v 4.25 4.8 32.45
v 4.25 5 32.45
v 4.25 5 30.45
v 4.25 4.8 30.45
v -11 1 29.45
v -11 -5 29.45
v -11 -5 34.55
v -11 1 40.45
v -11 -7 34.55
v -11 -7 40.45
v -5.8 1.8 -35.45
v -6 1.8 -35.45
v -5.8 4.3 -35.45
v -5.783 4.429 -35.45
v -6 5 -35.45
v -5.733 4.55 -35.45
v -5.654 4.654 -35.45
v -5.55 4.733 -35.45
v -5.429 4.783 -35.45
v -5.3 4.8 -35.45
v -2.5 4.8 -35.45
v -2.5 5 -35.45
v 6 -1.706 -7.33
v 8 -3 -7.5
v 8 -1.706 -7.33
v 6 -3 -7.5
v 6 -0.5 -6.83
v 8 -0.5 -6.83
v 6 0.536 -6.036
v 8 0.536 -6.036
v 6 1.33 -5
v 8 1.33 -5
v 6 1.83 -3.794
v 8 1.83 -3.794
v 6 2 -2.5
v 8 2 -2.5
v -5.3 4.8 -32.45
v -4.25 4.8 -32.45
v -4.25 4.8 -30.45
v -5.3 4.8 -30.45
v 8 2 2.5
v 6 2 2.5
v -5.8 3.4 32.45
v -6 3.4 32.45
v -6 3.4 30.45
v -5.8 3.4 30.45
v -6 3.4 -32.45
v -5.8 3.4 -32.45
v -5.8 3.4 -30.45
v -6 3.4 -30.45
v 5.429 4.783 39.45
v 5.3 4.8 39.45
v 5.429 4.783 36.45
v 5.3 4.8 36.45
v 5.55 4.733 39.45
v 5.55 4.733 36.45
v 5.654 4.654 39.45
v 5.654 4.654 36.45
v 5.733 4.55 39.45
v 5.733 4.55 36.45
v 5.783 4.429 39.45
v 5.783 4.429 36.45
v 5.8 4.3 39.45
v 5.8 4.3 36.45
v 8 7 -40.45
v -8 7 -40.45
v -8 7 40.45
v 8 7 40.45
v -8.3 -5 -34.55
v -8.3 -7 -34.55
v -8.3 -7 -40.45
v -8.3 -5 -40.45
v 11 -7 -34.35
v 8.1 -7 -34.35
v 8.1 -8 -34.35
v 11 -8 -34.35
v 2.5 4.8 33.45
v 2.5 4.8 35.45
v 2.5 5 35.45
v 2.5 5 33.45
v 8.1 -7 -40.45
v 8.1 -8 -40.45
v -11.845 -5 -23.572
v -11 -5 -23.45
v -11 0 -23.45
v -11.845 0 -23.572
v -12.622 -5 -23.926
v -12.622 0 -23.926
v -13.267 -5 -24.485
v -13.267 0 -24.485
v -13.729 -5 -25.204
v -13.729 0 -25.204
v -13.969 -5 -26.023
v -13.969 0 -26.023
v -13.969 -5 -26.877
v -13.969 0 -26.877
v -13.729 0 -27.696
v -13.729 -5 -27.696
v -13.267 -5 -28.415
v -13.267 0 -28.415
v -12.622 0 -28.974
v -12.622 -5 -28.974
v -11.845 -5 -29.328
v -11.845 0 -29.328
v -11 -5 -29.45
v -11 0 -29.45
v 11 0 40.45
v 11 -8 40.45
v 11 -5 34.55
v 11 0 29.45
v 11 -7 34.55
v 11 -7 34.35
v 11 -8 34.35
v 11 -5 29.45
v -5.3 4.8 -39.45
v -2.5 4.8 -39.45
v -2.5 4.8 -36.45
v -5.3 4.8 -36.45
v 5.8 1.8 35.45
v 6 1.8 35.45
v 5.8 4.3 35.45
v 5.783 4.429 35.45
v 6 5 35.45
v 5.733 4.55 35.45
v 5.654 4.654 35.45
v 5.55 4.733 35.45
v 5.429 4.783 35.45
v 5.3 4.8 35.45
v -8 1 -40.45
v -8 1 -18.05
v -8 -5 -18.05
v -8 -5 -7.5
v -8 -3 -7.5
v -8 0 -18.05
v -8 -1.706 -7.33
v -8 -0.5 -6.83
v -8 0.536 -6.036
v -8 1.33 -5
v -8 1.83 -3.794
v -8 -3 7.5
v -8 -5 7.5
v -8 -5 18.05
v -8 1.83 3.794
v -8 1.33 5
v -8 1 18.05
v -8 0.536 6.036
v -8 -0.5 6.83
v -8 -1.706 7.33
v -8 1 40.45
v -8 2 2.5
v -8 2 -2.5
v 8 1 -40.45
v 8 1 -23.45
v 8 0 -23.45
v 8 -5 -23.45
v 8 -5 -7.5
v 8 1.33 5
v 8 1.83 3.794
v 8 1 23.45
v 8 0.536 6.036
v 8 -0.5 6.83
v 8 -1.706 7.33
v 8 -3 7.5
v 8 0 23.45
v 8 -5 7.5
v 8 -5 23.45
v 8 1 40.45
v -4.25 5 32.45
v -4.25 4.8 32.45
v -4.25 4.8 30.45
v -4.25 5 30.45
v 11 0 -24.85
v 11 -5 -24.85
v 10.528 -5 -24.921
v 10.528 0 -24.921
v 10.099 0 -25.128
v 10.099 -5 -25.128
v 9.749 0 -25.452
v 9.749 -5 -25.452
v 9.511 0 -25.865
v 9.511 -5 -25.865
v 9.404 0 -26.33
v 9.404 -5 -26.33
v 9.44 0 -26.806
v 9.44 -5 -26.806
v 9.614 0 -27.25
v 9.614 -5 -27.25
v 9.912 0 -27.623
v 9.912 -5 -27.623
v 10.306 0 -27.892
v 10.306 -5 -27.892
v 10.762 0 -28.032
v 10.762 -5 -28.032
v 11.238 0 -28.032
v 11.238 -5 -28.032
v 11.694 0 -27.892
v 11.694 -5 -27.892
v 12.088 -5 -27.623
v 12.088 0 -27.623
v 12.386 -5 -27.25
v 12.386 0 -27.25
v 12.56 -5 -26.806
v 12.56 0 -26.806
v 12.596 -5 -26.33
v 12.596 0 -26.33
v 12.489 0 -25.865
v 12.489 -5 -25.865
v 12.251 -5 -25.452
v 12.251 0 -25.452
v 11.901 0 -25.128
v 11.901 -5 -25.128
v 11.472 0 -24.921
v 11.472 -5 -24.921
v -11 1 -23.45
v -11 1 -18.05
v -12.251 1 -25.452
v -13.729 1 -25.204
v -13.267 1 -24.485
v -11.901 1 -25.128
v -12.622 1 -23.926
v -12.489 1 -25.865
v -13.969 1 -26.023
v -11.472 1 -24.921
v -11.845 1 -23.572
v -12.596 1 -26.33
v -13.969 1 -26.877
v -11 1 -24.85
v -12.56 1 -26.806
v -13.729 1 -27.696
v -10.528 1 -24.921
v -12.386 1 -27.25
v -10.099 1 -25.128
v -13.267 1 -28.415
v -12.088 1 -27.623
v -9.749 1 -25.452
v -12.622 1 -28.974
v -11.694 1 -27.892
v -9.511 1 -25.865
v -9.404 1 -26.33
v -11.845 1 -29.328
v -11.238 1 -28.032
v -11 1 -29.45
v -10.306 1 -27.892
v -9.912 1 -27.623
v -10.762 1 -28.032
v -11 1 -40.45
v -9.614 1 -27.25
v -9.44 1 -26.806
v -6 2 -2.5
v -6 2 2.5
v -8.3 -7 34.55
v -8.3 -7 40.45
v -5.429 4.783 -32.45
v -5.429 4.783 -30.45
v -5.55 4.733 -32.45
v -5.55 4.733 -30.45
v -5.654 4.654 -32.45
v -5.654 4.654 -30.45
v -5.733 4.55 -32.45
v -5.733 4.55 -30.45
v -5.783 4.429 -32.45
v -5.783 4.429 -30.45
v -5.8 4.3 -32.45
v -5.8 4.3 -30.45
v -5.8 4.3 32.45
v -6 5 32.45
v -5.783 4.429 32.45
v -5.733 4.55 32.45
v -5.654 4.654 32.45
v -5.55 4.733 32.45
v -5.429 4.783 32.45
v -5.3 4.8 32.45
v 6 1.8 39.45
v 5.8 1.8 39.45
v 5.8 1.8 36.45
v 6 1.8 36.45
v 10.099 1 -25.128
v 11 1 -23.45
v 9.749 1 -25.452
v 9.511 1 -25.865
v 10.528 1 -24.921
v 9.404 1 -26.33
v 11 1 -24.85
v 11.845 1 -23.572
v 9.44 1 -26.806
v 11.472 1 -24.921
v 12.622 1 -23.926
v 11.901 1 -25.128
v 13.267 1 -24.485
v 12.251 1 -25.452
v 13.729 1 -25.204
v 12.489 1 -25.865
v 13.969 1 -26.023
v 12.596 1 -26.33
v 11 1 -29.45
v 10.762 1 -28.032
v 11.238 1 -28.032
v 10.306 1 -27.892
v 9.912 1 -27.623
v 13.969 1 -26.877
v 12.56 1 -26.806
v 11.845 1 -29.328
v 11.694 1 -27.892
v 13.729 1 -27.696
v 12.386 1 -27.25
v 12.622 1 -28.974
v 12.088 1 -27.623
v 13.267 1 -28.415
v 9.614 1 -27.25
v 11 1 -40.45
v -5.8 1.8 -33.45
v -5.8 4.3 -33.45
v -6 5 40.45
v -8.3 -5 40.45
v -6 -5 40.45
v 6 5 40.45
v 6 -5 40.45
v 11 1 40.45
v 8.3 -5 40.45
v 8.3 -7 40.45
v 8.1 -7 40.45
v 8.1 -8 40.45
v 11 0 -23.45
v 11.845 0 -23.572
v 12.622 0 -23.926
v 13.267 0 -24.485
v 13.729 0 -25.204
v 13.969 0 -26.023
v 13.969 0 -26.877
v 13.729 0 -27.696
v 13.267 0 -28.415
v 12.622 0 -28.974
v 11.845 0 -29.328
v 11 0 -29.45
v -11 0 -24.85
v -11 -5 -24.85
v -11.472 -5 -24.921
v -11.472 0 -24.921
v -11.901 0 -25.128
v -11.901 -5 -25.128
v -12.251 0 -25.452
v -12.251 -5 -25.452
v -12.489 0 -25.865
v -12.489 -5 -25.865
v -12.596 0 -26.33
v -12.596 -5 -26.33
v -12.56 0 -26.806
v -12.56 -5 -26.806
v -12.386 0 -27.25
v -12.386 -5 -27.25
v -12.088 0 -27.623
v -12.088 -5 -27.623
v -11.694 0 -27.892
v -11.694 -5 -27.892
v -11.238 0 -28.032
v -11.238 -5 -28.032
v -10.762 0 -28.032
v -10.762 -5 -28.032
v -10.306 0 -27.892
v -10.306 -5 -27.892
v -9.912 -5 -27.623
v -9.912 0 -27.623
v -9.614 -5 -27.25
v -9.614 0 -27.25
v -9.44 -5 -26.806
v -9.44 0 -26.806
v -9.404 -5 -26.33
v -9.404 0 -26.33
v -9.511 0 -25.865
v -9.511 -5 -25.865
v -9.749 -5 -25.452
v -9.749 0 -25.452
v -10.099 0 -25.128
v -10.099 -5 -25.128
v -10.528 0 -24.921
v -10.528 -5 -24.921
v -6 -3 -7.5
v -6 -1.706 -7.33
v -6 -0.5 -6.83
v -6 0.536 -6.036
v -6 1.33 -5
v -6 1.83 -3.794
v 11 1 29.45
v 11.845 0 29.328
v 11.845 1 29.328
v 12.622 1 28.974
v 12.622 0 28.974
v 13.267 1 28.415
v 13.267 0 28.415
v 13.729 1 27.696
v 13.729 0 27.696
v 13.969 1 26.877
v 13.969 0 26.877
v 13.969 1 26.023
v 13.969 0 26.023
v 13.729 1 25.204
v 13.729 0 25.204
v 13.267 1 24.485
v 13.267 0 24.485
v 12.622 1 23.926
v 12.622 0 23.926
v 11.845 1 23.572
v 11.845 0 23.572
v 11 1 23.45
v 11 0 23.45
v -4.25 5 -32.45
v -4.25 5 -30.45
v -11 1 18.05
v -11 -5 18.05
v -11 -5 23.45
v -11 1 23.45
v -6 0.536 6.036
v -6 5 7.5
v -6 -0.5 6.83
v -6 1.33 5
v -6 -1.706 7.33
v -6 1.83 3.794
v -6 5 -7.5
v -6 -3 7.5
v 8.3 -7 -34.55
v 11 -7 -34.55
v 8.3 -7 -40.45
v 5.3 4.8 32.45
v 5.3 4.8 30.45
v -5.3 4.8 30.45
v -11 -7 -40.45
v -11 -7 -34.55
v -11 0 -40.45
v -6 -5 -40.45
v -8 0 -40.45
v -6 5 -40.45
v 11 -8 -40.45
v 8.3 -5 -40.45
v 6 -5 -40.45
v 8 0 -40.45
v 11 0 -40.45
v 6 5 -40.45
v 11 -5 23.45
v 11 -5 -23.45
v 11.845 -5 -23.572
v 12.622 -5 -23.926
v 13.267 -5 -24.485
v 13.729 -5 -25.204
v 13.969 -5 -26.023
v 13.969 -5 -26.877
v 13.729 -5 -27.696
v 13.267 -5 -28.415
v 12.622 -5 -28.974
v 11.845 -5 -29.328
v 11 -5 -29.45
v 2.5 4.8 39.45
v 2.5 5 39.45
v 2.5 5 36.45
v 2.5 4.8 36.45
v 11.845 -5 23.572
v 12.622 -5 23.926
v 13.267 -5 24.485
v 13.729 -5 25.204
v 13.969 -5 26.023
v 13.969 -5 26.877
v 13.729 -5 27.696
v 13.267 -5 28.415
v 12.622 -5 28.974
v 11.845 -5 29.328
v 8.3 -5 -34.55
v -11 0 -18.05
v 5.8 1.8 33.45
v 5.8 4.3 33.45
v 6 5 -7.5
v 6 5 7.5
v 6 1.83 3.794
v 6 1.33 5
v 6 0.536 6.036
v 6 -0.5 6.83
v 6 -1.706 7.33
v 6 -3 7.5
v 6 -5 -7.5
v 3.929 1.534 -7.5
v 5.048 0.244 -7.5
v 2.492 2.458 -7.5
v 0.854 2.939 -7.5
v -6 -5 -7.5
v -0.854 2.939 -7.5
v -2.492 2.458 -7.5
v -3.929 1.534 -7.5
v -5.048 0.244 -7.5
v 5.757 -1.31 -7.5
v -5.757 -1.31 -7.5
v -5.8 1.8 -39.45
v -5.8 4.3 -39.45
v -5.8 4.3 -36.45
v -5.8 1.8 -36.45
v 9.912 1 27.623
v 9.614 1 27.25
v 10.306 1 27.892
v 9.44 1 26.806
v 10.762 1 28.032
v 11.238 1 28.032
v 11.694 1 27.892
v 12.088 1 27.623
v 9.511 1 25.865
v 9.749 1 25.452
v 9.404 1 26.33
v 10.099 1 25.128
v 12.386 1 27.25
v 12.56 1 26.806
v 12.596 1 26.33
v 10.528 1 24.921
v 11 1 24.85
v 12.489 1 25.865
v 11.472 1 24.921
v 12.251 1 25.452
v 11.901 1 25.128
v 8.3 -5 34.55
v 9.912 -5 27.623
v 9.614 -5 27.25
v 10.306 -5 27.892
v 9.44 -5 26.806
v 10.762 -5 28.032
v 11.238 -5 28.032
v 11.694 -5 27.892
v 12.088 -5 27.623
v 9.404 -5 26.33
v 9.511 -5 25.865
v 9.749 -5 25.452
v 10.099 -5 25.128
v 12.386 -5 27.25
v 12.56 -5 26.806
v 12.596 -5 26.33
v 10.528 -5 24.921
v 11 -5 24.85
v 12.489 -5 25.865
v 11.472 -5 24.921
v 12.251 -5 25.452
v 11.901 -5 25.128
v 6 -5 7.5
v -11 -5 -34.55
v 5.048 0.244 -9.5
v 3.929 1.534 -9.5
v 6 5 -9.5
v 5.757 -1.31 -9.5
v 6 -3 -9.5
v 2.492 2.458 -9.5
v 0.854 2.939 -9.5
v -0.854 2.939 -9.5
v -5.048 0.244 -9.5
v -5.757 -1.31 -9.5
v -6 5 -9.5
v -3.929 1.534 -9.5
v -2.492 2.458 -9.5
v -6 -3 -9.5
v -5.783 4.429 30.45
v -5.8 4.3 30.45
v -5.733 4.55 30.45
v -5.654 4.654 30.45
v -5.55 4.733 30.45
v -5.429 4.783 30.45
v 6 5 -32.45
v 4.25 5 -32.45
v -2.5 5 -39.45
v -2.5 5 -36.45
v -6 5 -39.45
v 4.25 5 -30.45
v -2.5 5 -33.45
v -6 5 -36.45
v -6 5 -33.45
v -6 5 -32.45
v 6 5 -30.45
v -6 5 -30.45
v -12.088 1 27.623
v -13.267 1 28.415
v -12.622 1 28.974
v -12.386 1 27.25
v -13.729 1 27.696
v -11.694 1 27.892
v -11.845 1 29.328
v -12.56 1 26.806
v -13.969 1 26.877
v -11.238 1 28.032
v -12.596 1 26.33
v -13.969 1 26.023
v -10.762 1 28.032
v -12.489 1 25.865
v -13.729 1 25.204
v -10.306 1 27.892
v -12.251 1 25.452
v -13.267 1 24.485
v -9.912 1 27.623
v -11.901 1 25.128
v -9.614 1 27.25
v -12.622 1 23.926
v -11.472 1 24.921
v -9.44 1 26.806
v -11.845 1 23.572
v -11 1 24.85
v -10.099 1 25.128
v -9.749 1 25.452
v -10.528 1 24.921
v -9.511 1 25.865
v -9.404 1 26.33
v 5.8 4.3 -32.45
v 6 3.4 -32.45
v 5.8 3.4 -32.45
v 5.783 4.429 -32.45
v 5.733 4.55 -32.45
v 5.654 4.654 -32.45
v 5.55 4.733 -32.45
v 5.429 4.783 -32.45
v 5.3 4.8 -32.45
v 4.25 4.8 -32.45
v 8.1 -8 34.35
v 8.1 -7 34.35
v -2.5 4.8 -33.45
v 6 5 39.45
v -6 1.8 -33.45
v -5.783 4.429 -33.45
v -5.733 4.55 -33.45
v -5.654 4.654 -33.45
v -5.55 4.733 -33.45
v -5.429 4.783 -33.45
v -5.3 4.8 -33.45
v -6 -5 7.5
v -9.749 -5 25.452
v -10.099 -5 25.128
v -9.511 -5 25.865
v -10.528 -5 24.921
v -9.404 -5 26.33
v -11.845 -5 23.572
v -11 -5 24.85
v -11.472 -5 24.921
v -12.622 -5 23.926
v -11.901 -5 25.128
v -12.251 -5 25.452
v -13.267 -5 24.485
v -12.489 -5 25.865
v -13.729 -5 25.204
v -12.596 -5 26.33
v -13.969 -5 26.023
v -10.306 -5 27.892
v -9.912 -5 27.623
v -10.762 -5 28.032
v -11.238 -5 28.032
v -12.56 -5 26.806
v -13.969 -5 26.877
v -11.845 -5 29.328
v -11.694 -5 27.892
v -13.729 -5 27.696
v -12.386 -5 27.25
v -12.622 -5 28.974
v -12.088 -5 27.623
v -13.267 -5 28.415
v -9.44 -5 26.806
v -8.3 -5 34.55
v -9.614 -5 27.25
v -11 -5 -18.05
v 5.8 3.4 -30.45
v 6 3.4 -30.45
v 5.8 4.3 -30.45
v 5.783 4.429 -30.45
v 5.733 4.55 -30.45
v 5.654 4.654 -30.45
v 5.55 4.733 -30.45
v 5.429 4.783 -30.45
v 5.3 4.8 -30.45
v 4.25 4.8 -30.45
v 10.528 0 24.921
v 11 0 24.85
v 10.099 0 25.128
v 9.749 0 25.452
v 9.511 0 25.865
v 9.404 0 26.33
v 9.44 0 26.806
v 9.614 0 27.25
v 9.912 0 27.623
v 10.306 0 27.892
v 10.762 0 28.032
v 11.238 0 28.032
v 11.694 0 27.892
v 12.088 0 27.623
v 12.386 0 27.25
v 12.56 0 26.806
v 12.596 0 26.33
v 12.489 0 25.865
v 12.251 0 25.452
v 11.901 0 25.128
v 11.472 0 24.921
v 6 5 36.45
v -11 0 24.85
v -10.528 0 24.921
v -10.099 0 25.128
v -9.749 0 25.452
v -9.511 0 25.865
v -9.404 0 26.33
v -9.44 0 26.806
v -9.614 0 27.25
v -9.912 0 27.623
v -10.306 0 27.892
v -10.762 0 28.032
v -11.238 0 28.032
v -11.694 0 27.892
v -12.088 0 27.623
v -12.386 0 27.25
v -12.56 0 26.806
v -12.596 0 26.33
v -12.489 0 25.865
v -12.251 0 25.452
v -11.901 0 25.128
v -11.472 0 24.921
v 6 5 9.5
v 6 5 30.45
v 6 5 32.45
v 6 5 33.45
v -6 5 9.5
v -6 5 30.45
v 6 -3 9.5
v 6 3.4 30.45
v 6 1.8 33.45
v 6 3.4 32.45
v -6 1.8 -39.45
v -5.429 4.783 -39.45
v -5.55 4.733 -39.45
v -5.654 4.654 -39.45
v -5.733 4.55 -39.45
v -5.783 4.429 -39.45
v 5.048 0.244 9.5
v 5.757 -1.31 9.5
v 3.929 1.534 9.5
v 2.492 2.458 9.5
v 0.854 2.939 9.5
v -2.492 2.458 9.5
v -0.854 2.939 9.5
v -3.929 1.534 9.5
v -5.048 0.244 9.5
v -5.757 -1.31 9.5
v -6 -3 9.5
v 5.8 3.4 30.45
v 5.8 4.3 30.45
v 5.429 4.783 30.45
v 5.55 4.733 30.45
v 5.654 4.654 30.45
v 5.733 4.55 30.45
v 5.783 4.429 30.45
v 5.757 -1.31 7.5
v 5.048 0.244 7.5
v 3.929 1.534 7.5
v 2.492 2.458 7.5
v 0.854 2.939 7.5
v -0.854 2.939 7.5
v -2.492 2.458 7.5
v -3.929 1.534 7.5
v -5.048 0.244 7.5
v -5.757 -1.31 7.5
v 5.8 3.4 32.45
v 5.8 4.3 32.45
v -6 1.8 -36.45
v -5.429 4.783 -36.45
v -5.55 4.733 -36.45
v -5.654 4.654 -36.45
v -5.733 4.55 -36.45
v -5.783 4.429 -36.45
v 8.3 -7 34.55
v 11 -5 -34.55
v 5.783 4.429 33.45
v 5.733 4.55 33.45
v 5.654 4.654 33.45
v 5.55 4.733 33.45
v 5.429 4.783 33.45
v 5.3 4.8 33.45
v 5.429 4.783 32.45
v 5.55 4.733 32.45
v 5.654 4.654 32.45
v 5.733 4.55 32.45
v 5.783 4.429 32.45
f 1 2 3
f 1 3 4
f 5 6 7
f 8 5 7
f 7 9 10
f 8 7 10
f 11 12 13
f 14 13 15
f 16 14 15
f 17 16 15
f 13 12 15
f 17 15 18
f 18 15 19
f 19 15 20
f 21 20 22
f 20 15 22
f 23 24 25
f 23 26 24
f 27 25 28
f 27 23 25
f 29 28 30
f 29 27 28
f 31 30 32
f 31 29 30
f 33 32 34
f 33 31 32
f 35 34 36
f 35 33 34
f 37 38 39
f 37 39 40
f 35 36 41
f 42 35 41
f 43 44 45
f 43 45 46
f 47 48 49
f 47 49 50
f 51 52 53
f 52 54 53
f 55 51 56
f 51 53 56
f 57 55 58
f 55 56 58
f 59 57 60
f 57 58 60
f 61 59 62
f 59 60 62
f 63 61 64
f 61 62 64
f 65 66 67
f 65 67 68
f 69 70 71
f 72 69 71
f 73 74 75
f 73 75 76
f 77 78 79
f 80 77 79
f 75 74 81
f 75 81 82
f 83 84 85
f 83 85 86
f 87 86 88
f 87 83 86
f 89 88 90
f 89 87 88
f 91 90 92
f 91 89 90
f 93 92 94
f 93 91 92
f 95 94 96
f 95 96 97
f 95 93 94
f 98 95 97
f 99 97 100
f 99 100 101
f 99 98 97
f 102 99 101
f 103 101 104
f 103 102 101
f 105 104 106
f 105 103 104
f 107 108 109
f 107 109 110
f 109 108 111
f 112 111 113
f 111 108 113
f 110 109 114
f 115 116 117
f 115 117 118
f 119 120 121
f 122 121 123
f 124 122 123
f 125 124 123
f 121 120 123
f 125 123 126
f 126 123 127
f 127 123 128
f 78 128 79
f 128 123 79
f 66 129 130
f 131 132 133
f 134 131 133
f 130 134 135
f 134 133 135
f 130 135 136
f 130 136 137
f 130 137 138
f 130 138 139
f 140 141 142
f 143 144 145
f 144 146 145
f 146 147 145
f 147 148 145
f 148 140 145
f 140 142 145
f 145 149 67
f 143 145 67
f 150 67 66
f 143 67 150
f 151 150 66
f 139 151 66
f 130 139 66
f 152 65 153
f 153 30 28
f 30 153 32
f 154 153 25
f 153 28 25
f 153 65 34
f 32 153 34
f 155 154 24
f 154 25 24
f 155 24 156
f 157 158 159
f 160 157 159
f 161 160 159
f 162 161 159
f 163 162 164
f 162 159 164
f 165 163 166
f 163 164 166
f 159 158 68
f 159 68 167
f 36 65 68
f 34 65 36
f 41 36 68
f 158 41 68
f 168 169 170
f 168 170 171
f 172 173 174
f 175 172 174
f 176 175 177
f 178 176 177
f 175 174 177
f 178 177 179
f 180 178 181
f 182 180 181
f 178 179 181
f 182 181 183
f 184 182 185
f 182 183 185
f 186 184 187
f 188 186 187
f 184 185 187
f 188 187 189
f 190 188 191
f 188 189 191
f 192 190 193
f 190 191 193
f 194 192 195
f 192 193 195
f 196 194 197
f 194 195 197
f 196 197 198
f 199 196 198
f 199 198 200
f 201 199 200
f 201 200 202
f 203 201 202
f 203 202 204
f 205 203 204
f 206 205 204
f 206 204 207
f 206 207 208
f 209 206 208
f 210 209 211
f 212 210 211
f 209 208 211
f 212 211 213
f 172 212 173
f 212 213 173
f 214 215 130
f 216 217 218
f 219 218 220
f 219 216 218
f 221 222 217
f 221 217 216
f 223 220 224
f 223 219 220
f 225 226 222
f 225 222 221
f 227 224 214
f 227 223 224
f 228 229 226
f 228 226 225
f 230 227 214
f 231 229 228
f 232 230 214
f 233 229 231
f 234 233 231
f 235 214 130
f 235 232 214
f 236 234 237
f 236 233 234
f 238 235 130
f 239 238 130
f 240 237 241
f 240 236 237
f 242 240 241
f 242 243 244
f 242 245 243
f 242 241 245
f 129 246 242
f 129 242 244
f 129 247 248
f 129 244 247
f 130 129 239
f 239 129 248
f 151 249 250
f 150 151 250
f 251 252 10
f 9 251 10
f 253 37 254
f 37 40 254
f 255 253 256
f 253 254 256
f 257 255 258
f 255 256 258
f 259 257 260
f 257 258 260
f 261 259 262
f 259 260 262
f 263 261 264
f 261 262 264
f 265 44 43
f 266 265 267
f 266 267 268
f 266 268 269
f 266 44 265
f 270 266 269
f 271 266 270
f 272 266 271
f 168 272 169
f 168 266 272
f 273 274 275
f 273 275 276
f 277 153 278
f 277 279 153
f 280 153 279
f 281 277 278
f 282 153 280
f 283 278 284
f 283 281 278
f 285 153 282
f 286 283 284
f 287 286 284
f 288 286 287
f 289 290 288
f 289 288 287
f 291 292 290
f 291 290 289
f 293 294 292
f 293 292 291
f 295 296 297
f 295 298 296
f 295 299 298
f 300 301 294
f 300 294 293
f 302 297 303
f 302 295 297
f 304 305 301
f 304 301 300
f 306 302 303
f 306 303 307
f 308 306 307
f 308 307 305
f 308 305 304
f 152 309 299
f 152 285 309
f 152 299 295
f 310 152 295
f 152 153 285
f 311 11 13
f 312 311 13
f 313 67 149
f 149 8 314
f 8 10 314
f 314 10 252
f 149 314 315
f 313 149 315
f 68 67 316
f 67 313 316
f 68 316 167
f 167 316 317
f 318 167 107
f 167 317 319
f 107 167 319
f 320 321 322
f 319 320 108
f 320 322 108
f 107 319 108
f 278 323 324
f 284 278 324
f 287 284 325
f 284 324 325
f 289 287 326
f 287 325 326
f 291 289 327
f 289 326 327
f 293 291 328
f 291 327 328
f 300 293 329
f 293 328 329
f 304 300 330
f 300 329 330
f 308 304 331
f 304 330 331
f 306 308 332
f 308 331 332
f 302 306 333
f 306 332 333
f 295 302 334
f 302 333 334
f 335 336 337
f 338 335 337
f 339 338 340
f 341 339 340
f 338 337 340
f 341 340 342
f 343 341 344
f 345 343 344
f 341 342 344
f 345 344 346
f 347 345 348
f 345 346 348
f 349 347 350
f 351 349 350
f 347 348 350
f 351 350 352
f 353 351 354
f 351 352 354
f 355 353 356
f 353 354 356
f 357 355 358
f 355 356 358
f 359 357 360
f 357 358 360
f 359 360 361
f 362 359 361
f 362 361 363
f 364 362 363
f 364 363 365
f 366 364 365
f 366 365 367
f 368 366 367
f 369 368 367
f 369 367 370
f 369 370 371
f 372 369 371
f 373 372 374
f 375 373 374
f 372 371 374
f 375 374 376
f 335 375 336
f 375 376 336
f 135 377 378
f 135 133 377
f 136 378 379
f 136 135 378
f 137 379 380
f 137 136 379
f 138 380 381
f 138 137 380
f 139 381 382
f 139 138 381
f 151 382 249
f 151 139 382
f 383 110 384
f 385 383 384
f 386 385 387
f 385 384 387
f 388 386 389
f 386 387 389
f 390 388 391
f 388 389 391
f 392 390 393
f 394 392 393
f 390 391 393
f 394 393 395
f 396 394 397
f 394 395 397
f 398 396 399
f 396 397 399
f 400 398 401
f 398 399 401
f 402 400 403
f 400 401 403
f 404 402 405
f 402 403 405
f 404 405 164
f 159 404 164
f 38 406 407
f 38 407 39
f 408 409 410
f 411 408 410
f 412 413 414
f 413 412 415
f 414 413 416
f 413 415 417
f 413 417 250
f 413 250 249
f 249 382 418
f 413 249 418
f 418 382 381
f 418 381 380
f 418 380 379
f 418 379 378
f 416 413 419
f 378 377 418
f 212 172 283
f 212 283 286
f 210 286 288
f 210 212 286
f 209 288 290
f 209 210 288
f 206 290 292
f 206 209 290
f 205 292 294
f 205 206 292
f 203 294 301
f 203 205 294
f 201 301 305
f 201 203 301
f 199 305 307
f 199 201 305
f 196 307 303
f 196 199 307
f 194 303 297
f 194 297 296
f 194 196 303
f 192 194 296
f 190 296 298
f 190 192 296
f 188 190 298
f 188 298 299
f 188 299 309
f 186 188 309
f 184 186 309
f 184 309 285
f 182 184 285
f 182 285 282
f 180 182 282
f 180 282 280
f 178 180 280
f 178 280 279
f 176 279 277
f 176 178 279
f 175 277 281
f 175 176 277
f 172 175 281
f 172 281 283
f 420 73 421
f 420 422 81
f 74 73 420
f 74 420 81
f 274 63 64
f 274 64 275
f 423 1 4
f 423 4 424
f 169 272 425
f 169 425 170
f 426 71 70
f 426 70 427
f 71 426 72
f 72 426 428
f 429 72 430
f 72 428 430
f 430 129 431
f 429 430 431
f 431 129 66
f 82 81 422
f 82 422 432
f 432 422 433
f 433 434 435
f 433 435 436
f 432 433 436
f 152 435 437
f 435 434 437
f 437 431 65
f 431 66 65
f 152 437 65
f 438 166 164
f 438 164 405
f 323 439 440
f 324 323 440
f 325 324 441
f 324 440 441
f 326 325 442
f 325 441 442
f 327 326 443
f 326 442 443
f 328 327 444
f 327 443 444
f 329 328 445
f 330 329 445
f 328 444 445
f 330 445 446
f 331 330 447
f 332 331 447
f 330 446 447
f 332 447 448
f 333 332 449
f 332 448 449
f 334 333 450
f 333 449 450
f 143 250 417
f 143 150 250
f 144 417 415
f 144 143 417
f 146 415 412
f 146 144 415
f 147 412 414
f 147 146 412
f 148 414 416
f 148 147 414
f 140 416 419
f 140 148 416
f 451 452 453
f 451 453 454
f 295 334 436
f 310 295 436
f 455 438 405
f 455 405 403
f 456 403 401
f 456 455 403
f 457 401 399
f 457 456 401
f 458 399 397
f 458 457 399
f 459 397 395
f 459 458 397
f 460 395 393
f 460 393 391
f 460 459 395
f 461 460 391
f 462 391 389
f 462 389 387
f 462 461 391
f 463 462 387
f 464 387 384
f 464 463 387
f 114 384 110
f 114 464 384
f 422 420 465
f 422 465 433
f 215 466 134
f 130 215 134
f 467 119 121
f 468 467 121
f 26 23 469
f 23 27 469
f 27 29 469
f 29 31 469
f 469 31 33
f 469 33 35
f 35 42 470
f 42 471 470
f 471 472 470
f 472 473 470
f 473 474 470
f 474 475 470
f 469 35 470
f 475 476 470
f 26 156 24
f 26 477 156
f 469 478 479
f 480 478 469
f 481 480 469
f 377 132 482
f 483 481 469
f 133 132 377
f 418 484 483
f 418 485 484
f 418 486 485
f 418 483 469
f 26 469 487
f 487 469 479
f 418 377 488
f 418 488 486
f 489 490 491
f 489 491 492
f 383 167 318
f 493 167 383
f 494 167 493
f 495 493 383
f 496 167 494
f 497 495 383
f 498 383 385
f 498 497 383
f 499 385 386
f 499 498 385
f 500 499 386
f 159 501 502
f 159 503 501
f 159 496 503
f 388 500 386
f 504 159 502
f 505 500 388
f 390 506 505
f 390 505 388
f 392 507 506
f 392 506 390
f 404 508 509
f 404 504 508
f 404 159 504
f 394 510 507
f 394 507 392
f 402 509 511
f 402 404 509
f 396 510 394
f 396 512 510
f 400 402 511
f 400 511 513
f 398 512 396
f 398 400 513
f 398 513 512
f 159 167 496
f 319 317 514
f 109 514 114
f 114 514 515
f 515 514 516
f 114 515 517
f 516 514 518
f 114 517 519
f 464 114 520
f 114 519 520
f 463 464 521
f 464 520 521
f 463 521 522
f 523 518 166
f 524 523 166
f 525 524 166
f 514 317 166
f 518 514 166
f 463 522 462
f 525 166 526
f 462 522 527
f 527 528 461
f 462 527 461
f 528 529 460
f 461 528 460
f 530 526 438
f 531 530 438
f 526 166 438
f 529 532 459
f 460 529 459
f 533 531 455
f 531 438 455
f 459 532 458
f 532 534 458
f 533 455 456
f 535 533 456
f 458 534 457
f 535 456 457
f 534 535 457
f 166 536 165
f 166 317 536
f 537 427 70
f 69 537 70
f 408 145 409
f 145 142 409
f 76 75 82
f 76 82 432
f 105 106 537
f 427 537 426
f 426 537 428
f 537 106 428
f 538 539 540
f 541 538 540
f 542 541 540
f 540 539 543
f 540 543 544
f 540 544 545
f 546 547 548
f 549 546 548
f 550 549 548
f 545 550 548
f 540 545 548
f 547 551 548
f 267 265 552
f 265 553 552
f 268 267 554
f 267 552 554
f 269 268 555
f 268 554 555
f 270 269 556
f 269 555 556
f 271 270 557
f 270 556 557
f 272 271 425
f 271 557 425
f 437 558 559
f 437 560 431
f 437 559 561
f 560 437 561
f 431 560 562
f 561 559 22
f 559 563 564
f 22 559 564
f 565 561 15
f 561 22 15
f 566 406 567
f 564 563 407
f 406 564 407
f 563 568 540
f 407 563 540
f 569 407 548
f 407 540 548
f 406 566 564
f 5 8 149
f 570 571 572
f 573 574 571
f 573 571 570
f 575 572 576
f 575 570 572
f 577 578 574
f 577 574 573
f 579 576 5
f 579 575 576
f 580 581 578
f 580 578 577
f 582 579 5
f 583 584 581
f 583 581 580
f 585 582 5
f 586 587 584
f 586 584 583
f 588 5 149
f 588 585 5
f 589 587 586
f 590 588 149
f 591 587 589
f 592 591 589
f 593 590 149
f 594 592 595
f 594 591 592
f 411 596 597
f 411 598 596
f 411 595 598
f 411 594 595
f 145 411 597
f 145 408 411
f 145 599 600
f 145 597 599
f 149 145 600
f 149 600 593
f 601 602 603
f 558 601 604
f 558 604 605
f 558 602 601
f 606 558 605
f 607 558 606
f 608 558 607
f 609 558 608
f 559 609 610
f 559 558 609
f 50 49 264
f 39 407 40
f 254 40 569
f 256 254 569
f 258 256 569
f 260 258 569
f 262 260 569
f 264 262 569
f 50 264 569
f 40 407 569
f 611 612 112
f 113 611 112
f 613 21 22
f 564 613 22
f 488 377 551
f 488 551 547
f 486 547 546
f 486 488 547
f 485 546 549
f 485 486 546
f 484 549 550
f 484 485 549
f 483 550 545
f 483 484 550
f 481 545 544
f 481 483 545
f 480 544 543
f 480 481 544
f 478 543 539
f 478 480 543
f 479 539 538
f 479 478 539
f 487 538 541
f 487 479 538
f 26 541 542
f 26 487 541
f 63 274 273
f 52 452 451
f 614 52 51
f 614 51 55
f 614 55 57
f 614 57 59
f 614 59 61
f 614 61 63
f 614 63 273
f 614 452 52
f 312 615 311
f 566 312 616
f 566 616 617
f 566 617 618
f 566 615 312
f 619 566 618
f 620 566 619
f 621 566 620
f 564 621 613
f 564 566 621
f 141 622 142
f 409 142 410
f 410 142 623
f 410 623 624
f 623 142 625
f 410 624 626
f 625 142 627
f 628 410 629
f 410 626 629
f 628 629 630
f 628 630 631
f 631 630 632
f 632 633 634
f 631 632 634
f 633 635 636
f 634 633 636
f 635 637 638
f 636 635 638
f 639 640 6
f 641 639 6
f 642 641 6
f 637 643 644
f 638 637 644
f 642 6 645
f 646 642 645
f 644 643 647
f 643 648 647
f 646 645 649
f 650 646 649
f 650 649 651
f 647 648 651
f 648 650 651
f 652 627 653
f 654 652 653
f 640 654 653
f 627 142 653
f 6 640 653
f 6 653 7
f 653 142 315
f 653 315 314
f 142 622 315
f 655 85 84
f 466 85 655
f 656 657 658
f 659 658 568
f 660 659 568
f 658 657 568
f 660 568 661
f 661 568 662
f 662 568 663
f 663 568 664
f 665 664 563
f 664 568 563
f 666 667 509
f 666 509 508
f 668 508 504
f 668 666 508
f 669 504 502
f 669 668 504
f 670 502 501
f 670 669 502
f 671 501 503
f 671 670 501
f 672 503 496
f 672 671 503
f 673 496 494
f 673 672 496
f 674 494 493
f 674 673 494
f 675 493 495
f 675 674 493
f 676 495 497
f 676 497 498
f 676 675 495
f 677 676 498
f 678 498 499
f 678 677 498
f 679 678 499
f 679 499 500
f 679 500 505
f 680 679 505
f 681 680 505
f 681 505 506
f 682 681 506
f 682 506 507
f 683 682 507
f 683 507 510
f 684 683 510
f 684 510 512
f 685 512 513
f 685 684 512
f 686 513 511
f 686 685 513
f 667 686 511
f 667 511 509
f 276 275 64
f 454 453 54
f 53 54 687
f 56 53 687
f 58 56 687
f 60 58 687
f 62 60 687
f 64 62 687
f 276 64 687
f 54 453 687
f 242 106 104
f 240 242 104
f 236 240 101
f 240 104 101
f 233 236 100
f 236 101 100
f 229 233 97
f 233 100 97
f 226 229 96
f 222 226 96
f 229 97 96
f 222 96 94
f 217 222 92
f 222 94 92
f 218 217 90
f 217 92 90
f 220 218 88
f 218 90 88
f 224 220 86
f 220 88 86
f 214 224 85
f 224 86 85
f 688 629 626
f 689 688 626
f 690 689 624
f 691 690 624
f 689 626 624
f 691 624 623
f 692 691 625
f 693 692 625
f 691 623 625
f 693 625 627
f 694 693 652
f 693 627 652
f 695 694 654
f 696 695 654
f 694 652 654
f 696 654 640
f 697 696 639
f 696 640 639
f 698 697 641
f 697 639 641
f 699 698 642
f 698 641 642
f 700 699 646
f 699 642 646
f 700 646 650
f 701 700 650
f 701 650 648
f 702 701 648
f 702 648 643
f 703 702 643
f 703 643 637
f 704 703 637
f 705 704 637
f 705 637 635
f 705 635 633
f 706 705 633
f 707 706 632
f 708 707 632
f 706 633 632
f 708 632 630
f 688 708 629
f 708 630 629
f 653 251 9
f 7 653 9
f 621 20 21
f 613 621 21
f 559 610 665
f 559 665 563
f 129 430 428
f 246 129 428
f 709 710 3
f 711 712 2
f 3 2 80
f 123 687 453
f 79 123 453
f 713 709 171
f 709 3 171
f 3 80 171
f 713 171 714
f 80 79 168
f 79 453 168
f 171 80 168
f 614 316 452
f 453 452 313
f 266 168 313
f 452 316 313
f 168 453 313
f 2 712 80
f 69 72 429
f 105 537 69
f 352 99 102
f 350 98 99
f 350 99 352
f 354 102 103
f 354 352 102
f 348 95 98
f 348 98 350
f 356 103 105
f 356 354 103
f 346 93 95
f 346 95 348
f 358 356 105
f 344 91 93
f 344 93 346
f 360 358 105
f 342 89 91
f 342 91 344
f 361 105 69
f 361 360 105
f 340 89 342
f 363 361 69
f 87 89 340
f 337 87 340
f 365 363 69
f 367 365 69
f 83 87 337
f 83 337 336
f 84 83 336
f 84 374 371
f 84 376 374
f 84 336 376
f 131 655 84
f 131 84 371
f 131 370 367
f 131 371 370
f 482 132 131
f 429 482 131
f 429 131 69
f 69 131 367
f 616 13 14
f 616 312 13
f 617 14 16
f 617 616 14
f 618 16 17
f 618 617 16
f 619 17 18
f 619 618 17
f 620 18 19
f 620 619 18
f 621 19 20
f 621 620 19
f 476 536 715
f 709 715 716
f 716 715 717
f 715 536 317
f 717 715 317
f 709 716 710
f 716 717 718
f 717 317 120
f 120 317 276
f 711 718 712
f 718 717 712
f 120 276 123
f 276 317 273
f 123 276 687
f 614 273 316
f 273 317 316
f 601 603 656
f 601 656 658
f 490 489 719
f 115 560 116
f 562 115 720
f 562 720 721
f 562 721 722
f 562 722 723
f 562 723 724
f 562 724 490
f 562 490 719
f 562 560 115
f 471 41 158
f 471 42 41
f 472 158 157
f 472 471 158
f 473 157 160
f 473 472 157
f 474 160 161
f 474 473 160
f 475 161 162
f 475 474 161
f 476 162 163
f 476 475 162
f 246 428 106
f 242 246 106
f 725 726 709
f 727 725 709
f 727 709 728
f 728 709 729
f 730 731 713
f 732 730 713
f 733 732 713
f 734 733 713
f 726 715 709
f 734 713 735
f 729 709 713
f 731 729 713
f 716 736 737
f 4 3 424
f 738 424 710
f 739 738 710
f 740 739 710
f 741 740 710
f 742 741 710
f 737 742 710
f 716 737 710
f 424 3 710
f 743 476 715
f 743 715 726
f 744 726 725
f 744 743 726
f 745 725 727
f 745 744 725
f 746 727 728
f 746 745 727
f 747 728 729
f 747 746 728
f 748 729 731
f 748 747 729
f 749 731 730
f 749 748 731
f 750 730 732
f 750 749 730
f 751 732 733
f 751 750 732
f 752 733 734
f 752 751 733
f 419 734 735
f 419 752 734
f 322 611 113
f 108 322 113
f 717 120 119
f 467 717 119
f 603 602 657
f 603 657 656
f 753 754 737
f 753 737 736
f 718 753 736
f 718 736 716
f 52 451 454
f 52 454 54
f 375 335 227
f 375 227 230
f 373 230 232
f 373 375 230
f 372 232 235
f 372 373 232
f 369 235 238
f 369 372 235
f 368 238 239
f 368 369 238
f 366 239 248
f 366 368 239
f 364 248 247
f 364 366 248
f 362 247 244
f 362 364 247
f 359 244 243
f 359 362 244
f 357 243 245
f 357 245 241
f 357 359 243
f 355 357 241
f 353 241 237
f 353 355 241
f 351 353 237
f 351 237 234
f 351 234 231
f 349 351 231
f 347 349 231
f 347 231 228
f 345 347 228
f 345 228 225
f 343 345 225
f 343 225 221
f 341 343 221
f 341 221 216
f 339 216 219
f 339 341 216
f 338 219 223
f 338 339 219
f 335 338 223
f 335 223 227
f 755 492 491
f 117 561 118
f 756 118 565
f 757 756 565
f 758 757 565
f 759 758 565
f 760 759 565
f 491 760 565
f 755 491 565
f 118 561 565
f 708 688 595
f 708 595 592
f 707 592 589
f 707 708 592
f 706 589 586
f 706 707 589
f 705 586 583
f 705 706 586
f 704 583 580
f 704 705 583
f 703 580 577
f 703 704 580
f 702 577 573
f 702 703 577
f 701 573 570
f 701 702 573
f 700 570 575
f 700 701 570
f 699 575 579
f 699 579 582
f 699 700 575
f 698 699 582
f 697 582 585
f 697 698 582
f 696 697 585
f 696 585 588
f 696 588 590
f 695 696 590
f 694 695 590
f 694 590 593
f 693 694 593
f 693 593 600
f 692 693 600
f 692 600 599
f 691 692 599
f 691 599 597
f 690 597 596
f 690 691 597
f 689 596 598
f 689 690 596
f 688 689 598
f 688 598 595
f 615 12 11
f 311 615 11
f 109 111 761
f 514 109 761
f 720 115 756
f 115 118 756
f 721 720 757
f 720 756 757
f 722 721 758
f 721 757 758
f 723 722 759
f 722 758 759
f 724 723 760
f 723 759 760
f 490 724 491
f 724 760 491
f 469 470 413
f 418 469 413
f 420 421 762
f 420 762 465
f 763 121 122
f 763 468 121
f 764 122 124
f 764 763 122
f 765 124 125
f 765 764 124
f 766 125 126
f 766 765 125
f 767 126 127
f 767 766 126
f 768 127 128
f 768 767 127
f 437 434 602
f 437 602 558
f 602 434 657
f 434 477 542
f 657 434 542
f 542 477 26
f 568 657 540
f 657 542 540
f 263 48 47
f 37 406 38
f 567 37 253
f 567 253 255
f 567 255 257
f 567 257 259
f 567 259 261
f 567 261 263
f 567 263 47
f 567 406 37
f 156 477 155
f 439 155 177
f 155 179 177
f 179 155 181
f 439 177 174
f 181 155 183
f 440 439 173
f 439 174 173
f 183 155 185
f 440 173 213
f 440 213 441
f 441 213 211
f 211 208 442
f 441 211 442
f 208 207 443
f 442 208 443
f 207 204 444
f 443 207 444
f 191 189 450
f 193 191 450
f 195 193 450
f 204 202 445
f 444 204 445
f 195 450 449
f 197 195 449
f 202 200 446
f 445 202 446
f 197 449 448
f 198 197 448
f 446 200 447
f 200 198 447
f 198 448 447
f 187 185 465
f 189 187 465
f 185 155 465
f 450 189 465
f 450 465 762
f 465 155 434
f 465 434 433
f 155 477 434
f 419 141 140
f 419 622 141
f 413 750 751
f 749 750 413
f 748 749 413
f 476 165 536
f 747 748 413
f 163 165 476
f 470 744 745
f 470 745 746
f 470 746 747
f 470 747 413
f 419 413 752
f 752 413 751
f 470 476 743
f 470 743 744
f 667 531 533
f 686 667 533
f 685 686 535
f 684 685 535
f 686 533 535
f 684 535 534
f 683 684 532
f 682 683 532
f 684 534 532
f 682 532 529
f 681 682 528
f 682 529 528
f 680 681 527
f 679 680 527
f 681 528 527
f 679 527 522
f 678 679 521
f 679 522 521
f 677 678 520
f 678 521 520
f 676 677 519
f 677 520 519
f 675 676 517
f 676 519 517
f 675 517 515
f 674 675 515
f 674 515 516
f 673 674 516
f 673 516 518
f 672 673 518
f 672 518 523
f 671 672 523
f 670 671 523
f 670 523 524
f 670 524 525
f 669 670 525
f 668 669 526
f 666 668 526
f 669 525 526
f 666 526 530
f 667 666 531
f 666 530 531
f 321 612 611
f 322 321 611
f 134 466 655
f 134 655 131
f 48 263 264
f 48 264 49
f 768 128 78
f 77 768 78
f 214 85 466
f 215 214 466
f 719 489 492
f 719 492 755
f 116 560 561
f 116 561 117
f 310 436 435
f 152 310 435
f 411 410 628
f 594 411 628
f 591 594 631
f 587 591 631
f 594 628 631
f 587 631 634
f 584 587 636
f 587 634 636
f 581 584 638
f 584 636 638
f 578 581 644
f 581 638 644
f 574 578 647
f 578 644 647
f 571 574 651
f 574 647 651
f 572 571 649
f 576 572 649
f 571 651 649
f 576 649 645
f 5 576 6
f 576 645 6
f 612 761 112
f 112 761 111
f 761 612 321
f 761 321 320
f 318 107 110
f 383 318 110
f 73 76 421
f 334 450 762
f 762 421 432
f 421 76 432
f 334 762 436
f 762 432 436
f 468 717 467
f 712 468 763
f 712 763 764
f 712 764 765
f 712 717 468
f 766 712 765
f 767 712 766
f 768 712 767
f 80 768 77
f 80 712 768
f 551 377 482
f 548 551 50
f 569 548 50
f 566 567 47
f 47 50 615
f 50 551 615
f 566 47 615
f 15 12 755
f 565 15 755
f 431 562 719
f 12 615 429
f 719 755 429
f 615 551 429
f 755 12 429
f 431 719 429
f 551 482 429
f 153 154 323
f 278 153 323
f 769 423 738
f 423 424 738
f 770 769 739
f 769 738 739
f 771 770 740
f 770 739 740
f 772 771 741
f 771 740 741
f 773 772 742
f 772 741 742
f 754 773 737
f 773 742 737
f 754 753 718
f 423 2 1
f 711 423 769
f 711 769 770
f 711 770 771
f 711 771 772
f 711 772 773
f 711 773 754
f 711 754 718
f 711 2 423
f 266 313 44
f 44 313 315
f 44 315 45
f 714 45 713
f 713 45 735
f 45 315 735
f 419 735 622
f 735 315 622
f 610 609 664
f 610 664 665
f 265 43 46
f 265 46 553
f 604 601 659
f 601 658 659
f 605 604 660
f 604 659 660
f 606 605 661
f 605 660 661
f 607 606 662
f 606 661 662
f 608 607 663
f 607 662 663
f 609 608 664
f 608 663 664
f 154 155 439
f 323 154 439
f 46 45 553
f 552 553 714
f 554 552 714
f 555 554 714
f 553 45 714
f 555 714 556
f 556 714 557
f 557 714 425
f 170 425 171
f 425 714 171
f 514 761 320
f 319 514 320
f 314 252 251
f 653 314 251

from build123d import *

# Parameters (mm, degrees)
BOSS_EXTRUDE1_DEPTH      = 34.25
BOSS_EXTRUDE2_DEPTH      = 6.2
BOSS_EXTRUDE3_DEPTH      = 6.2
SKETCH9_R                = 1.6
BOSS_EXTRUDE4_DEPTH      = 5
CUT_EXTRUDE1_START       = -16
SKETCH10_W               = 15
SKETCH10_H               = 7
CUT_EXTRUDE1_DEPTH       = 16
SKETCH11_W               = 12
SKETCH11_H               = 2
BOSS_EXTRUDE5_DEPTH      = 2
FILLET1_R                = 6
BOSS_EXTRUDE6_DEPTH      = 3
BOSS_EXTRUDE7_DEPTH      = 2
BOSS_EXTRUDE8_DEPTH      = 2
CIRPATTERN1_COUNT        = 2
FILLET2_R                = 0.5
FILLET4_R                = 5
BOSS_EXTRUDE9_DEPTH      = 6.1
BOSS_EXTRUDE10_START     = -5
BOSS_EXTRUDE10_OUTLINE_W = 3
BOSS_EXTRUDE10_OUTLINE_H = 4.9
BOSS_EXTRUDE10_DEPTH     = 5
SKETCH17_W               = 3
SKETCH17_H               = 4.9
BOSS_EXTRUDE11_DEPTH     = 5
BOSS_EXTRUDE12_START     = -5
BOSS_EXTRUDE12_OUTLINE_W = 3
BOSS_EXTRUDE12_OUTLINE_H = 5.4
BOSS_EXTRUDE12_DEPTH     = 5
CUT_EXTRUDE2_DEPTH       = 2
SKETCH21_R               = 1.6
BOSS_EXTRUDE13_DEPTH     = 1


# Read off the part's stored shape, not the designer's step: Boss-Extrude10, Boss-Extrude12
# Some blends are built 0.0001 mm under size
with BuildPart() as part:
    # Sketch1 → Boss-Extrude1 (new, symmetric)
    with BuildSketch(Plane.XY):
        Polygon((-8, -5), (-8, 7), (8, 7), (8, -5), (6, -5), (6, 5), (-6, 5), (-6, -5), align=None)
    extrude(amount=BOSS_EXTRUDE1_DEPTH, both=True)

    # Sketch6 → Boss-Extrude2 (add)
    with BuildSketch(Plane.XY.offset(34.25)):
        Polygon((6, 5), (6, -5), (8, -5), (8, 7), (-8, 7), (-8, -5), (-6, -5), (-6, 5), align=None)
    extrude(amount=BOSS_EXTRUDE2_DEPTH)

    # Sketch8 → Boss-Extrude3 (add)
    with BuildSketch(Plane(origin=(0, 0, -34.25), x_dir=(-1, 0, 0), z_dir=(0, 0, -1))):
        Polygon((-6, -5), (-6, 5), (6, 5), (6, -5), (8, -5), (8, 7), (-8, 7), (-8, -5), align=None)
    extrude(amount=BOSS_EXTRUDE3_DEPTH)

    # Sketch9 → Boss-Extrude4 (add)
    # profile 1 of 4: a face of its own
    with BuildSketch(Plane.XZ.offset(5)):
        with BuildLine():
            Line((-11, 29.45), (-6, 29.45))
            Line((-6, 29.45), (-6, 23.45))
            Line((-6, 23.45), (-11, 23.45))
            ThreePointArc((-11, 23.45), (-14, 26.45), (-11, 29.45))
        make_face()
        with Locations(Location((-11, 26.45, 0), (0, 0, 270))):
            Circle(SKETCH9_R, mode=Mode.SUBTRACT)
    # profile 2 of 4: a face of its own
    with BuildSketch(Plane.XZ.offset(5)):
        with BuildLine():
            Line((11, 29.45), (6, 29.45))
            Line((6, 29.45), (6, 23.45))
            Line((6, 23.45), (11, 23.45))
            ThreePointArc((11, 23.45), (14, 26.45), (11, 29.45))
        make_face()
        with Locations(Location((11, 26.45, 0), (0, 0, 270))):
            Circle(SKETCH9_R, mode=Mode.SUBTRACT)
    # profile 3 of 4: a face of its own
    with BuildSketch(Plane.XZ.offset(5)):
        with BuildLine():
            Line((6, -23.45), (11, -23.45))
            ThreePointArc((11, -23.45), (14, -26.45), (11, -29.45))
            Line((11, -29.45), (6, -29.45))
            Line((6, -29.45), (6, -23.45))
        make_face()
        with Locations(Location((11, -26.45, 0), (0, 0, 90))):
            Circle(SKETCH9_R, mode=Mode.SUBTRACT)
    # profile 4 of 4: a face of its own
    with BuildSketch(Plane.XZ.offset(5)):
        with BuildLine():
            Line((-6, -23.45), (-11, -23.45))
            ThreePointArc((-11, -23.45), (-14, -26.45), (-11, -29.45))
            Line((-11, -29.45), (-6, -29.45))
            Line((-6, -29.45), (-6, -23.45))
        make_face()
        with Locations(Location((-11, -26.45, 0), (0, 0, 90))):
            Circle(SKETCH9_R, mode=Mode.SUBTRACT)
    extrude(amount=-BOSS_EXTRUDE4_DEPTH)

    # Sketch10 → Cut-Extrude1 (cut)
    with BuildSketch(Plane.ZY.offset(8).offset(CUT_EXTRUDE1_START)):
        with Locations((0, -1.5)):
            Rectangle(SKETCH10_W, SKETCH10_H)
    extrude(amount=CUT_EXTRUDE1_DEPTH, mode=Mode.SUBTRACT)

    # Sketch11 → Boss-Extrude5 (add)
    with BuildSketch(Plane(origin=(0, 0, 7.5), x_dir=(-1, 0, 0), z_dir=(0, 0, -1))):
        with Locations((0, 4)):
            Rectangle(SKETCH11_W, SKETCH11_H)
    boss_extrude5 = extrude(amount=-BOSS_EXTRUDE5_DEPTH)

    # Mirror1: Boss-Extrude5 across plane
    add(boss_extrude5.mirror(Plane.XY))

    # Fillet1
    # the kernel refuses this fillet: 6 mm, written as the material it adds along each edge
    with BuildSketch(Plane(origin=(-6, 3, -7.5), x_dir=(0, -1, 0), z_dir=(0, 0, -1)), Plane(origin=(6, 3, 7.5), x_dir=(0, -1, 0), z_dir=(0, 0, 1))) as fillet1_piece_1:
        with BuildLine():
            CenterArc((FILLET1_R, -FILLET1_R), FILLET1_R, 90, 90)
            Line((0, -FILLET1_R), (0, 0))
            Line((0, 0), (FILLET1_R, 0))
        make_face()
    extrude(amount=2)
    with BuildSketch(Plane(origin=(6, 3, -7.5), x_dir=(0, -1, 0), z_dir=(0, 0, -1)), Plane(origin=(-6, 3, 7.5), x_dir=(0, -1, 0), z_dir=(0, 0, 1))) as fillet1_piece_2:
        with BuildLine():
            CenterArc((FILLET1_R, FILLET1_R), FILLET1_R, 180, 90)
            Line((0, FILLET1_R), (0, 0))
            Line((0, 0), (FILLET1_R, 0))
        make_face()
    extrude(amount=2)

    # Sketch12 → Boss-Extrude6 (add)
    with BuildSketch(Plane.XY.offset(39.45)):
        Polygon((2.5, 5), (2.5, 4.8), (5.8, 4.8), (5.8, 1.8), (6, 1.8), (6, 5), align=None)
    boss_extrude6 = extrude(amount=-BOSS_EXTRUDE6_DEPTH)

    # Sketch13 → Boss-Extrude7 (add)
    with BuildSketch(Plane(origin=(0, 0, 35.45), x_dir=(-1, 0, 0), z_dir=(0, 0, -1))):
        Polygon((-2.5, 5), (-6, 5), (-6, 1.8), (-5.8, 1.8), (-5.8, 4.8), (-2.5, 4.8), align=None)
    boss_extrude7 = extrude(amount=BOSS_EXTRUDE7_DEPTH)

    # Sketch14 → Boss-Extrude8 (add)
    with BuildSketch(Plane(origin=(0, 0, 32.45), x_dir=(-1, 0, 0), z_dir=(0, 0, -1))):
        Polygon((-6, 5), (-4.25, 5), (-4.25, 4.8), (-5.8, 4.8), (-5.8, 3.4), (-6, 3.4), align=None)
        Polygon((5.8, 3.4), (5.8, 4.8), (4.25, 4.8), (4.25, 5), (6, 5), (6, 3.4), align=None)
    boss_extrude8 = extrude(amount=BOSS_EXTRUDE8_DEPTH)

    # CirPattern1: Boss-Extrude6, Boss-Extrude7, Boss-Extrude8 ×2 about axis
    cirpattern1_axis = Axis((0, 0, 0), (0, 1, 0))
    add([boss_extrude6.rotate(cirpattern1_axis, i * 360 / CIRPATTERN1_COUNT) for i in range(1, CIRPATTERN1_COUNT)])
    add([boss_extrude7.rotate(cirpattern1_axis, i * 360 / CIRPATTERN1_COUNT) for i in range(1, CIRPATTERN1_COUNT)])
    add([boss_extrude8.rotate(cirpattern1_axis, i * 360 / CIRPATTERN1_COUNT) for i in range(1, CIRPATTERN1_COUNT)])

    # Fillet2
    fillet2_edges = [part.edges().sort_by_distance(p)[0] for p in [
        (5.8, 4.8, 37.95),
        (5.8, 4.8, 34.45),
        (5.8, 4.8, 31.45),
        (-5.8, 4.8, 31.45),
        (-5.8, 4.8, -37.95),
        (-5.8, 4.8, -34.45),
        (-5.8, 4.8, -31.45),
        (5.8, 4.8, -31.45),
    ]]
    fillet(fillet2_edges, radius=FILLET2_R)

    # Fillet4
    fillet4_edges = [part.edges().sort_by_distance(p)[0] for p in [
        (7, 2, -7.5),
        (-7, 2, -7.5),
        (7, 2, 7.5),
        (-7, 2, 7.5),
    ]]
    fillet(fillet4_edges, radius=FILLET4_R - 0.0001)  # a hair under: the kernel refuses the full size

    # Sketch15 → Boss-Extrude9 (add)
    with BuildSketch(Plane.XY.offset(40.45)):
        Polygon((8, -5), (8.1, -5), (8.1, -8), (11, -8), (11, 0), (8, 0), align=None)
        Polygon((-8, -5), (-8.1, -5), (-8.1, -7), (-11, -7), (-11, 0), (-8, 0), align=None)
    boss_extrude9 = extrude(amount=-BOSS_EXTRUDE9_DEPTH)

    # Boss-Extrude10 outline → Boss-Extrude10 (add)
    with BuildSketch(Plane(origin=(0, 0, 0), x_dir=(1, 0, 0), z_dir=(0, 1, 0)).offset(BOSS_EXTRUDE10_START)):
        with Locations((9.5, -31.9)):
            Rectangle(BOSS_EXTRUDE10_OUTLINE_W, BOSS_EXTRUDE10_OUTLINE_H)
        with Locations((-9.5, -31.9)):
            Rectangle(BOSS_EXTRUDE10_OUTLINE_W, BOSS_EXTRUDE10_OUTLINE_H)
    extrude(amount=BOSS_EXTRUDE10_DEPTH)

    # Mirror3: Boss-Extrude9 across plane
    add(boss_extrude9.mirror(Plane.XY))

    # Sketch17 → Boss-Extrude11 (add)
    with BuildSketch(Plane(origin=(0, 0, 0), x_dir=(1, 0, 0), z_dir=(0, 1, 0))):
        with Locations((-9.5, 31.9)):
            Rectangle(SKETCH17_W, SKETCH17_H)
        with Locations((9.5, 31.9)):
            Rectangle(SKETCH17_W, SKETCH17_H)
    extrude(amount=-BOSS_EXTRUDE11_DEPTH)

    # Boss-Extrude12 outline → Boss-Extrude12 (add)
    with BuildSketch(Plane.XZ.offset(5).offset(BOSS_EXTRUDE12_START)):
        with Locations((-9.5, -20.75)):
            Rectangle(BOSS_EXTRUDE12_OUTLINE_W, BOSS_EXTRUDE12_OUTLINE_H)
        with Locations((-9.5, 20.75)):
            Rectangle(BOSS_EXTRUDE12_OUTLINE_W, BOSS_EXTRUDE12_OUTLINE_H)
    extrude(amount=BOSS_EXTRUDE12_DEPTH)

    # Sketch20 → Cut-Extrude2 (cut)
    with BuildSketch(Plane.XZ.offset(7)):
        Polygon((-8.3, -34.35), (-11, -34.35), (-11, -34.55), (-8.3, -34.55), (-8.3, -40.45), (-8.1, -40.45), (-8.1, -34.55), (-8.1, -34.35), align=None)
        Polygon((8.3, 40.45), (8.1, 40.45), (8.1, 34.55), (8.1, 34.35), (8.3, 34.35), (11, 34.35), (11, 34.55), (8.3, 34.55), align=None)
        Polygon((8.1, -34.35), (11, -34.35), (11, -34.55), (8.3, -34.55), (8.3, -40.45), (8.1, -40.45), align=None)
        Polygon((-11, 34.35), (-8.1, 34.35), (-8.1, 40.45), (-8.3, 40.45), (-8.3, 34.55), (-11, 34.55), align=None)
    extrude(amount=-CUT_EXTRUDE2_DEPTH, mode=Mode.SUBTRACT)

    # Sketch21 → Boss-Extrude13 (add)
    # profile 1 of 4: a face of its own
    with BuildSketch(Plane(origin=(0, 0, 0), x_dir=(1, 0, 0), z_dir=(0, 1, 0))):
        with BuildLine():
            Line((-11, -29.45), (-11, -40.45))
            Line((-11, -40.45), (-8, -40.45))
            Line((-8, -40.45), (-8, -18.05))
            Line((-8, -18.05), (-11, -18.05))
            Line((-11, -18.05), (-11, -23.45))
            ThreePointArc((-11, -23.45), (-14, -26.45), (-11, -29.45))
        make_face()
        with Locations(Location((-11, -26.45, 0), (0, 0, 90))):
            Circle(SKETCH21_R, mode=Mode.SUBTRACT)
    # profile 2 of 4: a face of its own
    with BuildSketch(Plane(origin=(0, 0, 0), x_dir=(1, 0, 0), z_dir=(0, 1, 0))):
        with BuildLine():
            Line((11, -23.45), (8, -23.45))
            Line((8, -23.45), (8, -40.45))
            Line((8, -40.45), (11, -40.45))
            Line((11, -40.45), (11, -29.45))
            ThreePointArc((11, -29.45), (14, -26.45), (11, -23.45))
        make_face()
        with Locations(Location((11, -26.45, 0), (0, 0, 90))):
            Circle(SKETCH21_R, mode=Mode.SUBTRACT)
    # profile 3 of 4: a face of its own
    with BuildSketch(Plane(origin=(0, 0, 0), x_dir=(1, 0, 0), z_dir=(0, 1, 0))):
        with BuildLine():
            Line((8, 40.45), (8, 23.45))
            Line((8, 23.45), (11, 23.45))
            ThreePointArc((11, 23.45), (14, 26.45), (11, 29.45))
            Line((11, 29.45), (11, 40.45))
            Line((11, 40.45), (8, 40.45))
        make_face()
        with Locations(Location((11, 26.45, 0), (0, 0, 270))):
            Circle(SKETCH21_R, mode=Mode.SUBTRACT)
    # profile 4 of 4: a face of its own
    with BuildSketch(Plane(origin=(0, 0, 0), x_dir=(1, 0, 0), z_dir=(0, 1, 0))):
        with BuildLine():
            Line((-8, 18.05), (-8, 40.45))
            Line((-8, 40.45), (-11, 40.45))
            Line((-11, 40.45), (-11, 29.45))
            ThreePointArc((-11, 29.45), (-14, 26.45), (-11, 23.45))
            Line((-11, 23.45), (-11, 18.05))
            Line((-11, 18.05), (-8, 18.05))
        make_face()
        with Locations(Location((-11, 26.45, 0), (0, 0, 270))):
            Circle(SKETCH21_R, mode=Mode.SUBTRACT)
    extrude(amount=BOSS_EXTRUDE13_DEPTH)


solid = part.part
